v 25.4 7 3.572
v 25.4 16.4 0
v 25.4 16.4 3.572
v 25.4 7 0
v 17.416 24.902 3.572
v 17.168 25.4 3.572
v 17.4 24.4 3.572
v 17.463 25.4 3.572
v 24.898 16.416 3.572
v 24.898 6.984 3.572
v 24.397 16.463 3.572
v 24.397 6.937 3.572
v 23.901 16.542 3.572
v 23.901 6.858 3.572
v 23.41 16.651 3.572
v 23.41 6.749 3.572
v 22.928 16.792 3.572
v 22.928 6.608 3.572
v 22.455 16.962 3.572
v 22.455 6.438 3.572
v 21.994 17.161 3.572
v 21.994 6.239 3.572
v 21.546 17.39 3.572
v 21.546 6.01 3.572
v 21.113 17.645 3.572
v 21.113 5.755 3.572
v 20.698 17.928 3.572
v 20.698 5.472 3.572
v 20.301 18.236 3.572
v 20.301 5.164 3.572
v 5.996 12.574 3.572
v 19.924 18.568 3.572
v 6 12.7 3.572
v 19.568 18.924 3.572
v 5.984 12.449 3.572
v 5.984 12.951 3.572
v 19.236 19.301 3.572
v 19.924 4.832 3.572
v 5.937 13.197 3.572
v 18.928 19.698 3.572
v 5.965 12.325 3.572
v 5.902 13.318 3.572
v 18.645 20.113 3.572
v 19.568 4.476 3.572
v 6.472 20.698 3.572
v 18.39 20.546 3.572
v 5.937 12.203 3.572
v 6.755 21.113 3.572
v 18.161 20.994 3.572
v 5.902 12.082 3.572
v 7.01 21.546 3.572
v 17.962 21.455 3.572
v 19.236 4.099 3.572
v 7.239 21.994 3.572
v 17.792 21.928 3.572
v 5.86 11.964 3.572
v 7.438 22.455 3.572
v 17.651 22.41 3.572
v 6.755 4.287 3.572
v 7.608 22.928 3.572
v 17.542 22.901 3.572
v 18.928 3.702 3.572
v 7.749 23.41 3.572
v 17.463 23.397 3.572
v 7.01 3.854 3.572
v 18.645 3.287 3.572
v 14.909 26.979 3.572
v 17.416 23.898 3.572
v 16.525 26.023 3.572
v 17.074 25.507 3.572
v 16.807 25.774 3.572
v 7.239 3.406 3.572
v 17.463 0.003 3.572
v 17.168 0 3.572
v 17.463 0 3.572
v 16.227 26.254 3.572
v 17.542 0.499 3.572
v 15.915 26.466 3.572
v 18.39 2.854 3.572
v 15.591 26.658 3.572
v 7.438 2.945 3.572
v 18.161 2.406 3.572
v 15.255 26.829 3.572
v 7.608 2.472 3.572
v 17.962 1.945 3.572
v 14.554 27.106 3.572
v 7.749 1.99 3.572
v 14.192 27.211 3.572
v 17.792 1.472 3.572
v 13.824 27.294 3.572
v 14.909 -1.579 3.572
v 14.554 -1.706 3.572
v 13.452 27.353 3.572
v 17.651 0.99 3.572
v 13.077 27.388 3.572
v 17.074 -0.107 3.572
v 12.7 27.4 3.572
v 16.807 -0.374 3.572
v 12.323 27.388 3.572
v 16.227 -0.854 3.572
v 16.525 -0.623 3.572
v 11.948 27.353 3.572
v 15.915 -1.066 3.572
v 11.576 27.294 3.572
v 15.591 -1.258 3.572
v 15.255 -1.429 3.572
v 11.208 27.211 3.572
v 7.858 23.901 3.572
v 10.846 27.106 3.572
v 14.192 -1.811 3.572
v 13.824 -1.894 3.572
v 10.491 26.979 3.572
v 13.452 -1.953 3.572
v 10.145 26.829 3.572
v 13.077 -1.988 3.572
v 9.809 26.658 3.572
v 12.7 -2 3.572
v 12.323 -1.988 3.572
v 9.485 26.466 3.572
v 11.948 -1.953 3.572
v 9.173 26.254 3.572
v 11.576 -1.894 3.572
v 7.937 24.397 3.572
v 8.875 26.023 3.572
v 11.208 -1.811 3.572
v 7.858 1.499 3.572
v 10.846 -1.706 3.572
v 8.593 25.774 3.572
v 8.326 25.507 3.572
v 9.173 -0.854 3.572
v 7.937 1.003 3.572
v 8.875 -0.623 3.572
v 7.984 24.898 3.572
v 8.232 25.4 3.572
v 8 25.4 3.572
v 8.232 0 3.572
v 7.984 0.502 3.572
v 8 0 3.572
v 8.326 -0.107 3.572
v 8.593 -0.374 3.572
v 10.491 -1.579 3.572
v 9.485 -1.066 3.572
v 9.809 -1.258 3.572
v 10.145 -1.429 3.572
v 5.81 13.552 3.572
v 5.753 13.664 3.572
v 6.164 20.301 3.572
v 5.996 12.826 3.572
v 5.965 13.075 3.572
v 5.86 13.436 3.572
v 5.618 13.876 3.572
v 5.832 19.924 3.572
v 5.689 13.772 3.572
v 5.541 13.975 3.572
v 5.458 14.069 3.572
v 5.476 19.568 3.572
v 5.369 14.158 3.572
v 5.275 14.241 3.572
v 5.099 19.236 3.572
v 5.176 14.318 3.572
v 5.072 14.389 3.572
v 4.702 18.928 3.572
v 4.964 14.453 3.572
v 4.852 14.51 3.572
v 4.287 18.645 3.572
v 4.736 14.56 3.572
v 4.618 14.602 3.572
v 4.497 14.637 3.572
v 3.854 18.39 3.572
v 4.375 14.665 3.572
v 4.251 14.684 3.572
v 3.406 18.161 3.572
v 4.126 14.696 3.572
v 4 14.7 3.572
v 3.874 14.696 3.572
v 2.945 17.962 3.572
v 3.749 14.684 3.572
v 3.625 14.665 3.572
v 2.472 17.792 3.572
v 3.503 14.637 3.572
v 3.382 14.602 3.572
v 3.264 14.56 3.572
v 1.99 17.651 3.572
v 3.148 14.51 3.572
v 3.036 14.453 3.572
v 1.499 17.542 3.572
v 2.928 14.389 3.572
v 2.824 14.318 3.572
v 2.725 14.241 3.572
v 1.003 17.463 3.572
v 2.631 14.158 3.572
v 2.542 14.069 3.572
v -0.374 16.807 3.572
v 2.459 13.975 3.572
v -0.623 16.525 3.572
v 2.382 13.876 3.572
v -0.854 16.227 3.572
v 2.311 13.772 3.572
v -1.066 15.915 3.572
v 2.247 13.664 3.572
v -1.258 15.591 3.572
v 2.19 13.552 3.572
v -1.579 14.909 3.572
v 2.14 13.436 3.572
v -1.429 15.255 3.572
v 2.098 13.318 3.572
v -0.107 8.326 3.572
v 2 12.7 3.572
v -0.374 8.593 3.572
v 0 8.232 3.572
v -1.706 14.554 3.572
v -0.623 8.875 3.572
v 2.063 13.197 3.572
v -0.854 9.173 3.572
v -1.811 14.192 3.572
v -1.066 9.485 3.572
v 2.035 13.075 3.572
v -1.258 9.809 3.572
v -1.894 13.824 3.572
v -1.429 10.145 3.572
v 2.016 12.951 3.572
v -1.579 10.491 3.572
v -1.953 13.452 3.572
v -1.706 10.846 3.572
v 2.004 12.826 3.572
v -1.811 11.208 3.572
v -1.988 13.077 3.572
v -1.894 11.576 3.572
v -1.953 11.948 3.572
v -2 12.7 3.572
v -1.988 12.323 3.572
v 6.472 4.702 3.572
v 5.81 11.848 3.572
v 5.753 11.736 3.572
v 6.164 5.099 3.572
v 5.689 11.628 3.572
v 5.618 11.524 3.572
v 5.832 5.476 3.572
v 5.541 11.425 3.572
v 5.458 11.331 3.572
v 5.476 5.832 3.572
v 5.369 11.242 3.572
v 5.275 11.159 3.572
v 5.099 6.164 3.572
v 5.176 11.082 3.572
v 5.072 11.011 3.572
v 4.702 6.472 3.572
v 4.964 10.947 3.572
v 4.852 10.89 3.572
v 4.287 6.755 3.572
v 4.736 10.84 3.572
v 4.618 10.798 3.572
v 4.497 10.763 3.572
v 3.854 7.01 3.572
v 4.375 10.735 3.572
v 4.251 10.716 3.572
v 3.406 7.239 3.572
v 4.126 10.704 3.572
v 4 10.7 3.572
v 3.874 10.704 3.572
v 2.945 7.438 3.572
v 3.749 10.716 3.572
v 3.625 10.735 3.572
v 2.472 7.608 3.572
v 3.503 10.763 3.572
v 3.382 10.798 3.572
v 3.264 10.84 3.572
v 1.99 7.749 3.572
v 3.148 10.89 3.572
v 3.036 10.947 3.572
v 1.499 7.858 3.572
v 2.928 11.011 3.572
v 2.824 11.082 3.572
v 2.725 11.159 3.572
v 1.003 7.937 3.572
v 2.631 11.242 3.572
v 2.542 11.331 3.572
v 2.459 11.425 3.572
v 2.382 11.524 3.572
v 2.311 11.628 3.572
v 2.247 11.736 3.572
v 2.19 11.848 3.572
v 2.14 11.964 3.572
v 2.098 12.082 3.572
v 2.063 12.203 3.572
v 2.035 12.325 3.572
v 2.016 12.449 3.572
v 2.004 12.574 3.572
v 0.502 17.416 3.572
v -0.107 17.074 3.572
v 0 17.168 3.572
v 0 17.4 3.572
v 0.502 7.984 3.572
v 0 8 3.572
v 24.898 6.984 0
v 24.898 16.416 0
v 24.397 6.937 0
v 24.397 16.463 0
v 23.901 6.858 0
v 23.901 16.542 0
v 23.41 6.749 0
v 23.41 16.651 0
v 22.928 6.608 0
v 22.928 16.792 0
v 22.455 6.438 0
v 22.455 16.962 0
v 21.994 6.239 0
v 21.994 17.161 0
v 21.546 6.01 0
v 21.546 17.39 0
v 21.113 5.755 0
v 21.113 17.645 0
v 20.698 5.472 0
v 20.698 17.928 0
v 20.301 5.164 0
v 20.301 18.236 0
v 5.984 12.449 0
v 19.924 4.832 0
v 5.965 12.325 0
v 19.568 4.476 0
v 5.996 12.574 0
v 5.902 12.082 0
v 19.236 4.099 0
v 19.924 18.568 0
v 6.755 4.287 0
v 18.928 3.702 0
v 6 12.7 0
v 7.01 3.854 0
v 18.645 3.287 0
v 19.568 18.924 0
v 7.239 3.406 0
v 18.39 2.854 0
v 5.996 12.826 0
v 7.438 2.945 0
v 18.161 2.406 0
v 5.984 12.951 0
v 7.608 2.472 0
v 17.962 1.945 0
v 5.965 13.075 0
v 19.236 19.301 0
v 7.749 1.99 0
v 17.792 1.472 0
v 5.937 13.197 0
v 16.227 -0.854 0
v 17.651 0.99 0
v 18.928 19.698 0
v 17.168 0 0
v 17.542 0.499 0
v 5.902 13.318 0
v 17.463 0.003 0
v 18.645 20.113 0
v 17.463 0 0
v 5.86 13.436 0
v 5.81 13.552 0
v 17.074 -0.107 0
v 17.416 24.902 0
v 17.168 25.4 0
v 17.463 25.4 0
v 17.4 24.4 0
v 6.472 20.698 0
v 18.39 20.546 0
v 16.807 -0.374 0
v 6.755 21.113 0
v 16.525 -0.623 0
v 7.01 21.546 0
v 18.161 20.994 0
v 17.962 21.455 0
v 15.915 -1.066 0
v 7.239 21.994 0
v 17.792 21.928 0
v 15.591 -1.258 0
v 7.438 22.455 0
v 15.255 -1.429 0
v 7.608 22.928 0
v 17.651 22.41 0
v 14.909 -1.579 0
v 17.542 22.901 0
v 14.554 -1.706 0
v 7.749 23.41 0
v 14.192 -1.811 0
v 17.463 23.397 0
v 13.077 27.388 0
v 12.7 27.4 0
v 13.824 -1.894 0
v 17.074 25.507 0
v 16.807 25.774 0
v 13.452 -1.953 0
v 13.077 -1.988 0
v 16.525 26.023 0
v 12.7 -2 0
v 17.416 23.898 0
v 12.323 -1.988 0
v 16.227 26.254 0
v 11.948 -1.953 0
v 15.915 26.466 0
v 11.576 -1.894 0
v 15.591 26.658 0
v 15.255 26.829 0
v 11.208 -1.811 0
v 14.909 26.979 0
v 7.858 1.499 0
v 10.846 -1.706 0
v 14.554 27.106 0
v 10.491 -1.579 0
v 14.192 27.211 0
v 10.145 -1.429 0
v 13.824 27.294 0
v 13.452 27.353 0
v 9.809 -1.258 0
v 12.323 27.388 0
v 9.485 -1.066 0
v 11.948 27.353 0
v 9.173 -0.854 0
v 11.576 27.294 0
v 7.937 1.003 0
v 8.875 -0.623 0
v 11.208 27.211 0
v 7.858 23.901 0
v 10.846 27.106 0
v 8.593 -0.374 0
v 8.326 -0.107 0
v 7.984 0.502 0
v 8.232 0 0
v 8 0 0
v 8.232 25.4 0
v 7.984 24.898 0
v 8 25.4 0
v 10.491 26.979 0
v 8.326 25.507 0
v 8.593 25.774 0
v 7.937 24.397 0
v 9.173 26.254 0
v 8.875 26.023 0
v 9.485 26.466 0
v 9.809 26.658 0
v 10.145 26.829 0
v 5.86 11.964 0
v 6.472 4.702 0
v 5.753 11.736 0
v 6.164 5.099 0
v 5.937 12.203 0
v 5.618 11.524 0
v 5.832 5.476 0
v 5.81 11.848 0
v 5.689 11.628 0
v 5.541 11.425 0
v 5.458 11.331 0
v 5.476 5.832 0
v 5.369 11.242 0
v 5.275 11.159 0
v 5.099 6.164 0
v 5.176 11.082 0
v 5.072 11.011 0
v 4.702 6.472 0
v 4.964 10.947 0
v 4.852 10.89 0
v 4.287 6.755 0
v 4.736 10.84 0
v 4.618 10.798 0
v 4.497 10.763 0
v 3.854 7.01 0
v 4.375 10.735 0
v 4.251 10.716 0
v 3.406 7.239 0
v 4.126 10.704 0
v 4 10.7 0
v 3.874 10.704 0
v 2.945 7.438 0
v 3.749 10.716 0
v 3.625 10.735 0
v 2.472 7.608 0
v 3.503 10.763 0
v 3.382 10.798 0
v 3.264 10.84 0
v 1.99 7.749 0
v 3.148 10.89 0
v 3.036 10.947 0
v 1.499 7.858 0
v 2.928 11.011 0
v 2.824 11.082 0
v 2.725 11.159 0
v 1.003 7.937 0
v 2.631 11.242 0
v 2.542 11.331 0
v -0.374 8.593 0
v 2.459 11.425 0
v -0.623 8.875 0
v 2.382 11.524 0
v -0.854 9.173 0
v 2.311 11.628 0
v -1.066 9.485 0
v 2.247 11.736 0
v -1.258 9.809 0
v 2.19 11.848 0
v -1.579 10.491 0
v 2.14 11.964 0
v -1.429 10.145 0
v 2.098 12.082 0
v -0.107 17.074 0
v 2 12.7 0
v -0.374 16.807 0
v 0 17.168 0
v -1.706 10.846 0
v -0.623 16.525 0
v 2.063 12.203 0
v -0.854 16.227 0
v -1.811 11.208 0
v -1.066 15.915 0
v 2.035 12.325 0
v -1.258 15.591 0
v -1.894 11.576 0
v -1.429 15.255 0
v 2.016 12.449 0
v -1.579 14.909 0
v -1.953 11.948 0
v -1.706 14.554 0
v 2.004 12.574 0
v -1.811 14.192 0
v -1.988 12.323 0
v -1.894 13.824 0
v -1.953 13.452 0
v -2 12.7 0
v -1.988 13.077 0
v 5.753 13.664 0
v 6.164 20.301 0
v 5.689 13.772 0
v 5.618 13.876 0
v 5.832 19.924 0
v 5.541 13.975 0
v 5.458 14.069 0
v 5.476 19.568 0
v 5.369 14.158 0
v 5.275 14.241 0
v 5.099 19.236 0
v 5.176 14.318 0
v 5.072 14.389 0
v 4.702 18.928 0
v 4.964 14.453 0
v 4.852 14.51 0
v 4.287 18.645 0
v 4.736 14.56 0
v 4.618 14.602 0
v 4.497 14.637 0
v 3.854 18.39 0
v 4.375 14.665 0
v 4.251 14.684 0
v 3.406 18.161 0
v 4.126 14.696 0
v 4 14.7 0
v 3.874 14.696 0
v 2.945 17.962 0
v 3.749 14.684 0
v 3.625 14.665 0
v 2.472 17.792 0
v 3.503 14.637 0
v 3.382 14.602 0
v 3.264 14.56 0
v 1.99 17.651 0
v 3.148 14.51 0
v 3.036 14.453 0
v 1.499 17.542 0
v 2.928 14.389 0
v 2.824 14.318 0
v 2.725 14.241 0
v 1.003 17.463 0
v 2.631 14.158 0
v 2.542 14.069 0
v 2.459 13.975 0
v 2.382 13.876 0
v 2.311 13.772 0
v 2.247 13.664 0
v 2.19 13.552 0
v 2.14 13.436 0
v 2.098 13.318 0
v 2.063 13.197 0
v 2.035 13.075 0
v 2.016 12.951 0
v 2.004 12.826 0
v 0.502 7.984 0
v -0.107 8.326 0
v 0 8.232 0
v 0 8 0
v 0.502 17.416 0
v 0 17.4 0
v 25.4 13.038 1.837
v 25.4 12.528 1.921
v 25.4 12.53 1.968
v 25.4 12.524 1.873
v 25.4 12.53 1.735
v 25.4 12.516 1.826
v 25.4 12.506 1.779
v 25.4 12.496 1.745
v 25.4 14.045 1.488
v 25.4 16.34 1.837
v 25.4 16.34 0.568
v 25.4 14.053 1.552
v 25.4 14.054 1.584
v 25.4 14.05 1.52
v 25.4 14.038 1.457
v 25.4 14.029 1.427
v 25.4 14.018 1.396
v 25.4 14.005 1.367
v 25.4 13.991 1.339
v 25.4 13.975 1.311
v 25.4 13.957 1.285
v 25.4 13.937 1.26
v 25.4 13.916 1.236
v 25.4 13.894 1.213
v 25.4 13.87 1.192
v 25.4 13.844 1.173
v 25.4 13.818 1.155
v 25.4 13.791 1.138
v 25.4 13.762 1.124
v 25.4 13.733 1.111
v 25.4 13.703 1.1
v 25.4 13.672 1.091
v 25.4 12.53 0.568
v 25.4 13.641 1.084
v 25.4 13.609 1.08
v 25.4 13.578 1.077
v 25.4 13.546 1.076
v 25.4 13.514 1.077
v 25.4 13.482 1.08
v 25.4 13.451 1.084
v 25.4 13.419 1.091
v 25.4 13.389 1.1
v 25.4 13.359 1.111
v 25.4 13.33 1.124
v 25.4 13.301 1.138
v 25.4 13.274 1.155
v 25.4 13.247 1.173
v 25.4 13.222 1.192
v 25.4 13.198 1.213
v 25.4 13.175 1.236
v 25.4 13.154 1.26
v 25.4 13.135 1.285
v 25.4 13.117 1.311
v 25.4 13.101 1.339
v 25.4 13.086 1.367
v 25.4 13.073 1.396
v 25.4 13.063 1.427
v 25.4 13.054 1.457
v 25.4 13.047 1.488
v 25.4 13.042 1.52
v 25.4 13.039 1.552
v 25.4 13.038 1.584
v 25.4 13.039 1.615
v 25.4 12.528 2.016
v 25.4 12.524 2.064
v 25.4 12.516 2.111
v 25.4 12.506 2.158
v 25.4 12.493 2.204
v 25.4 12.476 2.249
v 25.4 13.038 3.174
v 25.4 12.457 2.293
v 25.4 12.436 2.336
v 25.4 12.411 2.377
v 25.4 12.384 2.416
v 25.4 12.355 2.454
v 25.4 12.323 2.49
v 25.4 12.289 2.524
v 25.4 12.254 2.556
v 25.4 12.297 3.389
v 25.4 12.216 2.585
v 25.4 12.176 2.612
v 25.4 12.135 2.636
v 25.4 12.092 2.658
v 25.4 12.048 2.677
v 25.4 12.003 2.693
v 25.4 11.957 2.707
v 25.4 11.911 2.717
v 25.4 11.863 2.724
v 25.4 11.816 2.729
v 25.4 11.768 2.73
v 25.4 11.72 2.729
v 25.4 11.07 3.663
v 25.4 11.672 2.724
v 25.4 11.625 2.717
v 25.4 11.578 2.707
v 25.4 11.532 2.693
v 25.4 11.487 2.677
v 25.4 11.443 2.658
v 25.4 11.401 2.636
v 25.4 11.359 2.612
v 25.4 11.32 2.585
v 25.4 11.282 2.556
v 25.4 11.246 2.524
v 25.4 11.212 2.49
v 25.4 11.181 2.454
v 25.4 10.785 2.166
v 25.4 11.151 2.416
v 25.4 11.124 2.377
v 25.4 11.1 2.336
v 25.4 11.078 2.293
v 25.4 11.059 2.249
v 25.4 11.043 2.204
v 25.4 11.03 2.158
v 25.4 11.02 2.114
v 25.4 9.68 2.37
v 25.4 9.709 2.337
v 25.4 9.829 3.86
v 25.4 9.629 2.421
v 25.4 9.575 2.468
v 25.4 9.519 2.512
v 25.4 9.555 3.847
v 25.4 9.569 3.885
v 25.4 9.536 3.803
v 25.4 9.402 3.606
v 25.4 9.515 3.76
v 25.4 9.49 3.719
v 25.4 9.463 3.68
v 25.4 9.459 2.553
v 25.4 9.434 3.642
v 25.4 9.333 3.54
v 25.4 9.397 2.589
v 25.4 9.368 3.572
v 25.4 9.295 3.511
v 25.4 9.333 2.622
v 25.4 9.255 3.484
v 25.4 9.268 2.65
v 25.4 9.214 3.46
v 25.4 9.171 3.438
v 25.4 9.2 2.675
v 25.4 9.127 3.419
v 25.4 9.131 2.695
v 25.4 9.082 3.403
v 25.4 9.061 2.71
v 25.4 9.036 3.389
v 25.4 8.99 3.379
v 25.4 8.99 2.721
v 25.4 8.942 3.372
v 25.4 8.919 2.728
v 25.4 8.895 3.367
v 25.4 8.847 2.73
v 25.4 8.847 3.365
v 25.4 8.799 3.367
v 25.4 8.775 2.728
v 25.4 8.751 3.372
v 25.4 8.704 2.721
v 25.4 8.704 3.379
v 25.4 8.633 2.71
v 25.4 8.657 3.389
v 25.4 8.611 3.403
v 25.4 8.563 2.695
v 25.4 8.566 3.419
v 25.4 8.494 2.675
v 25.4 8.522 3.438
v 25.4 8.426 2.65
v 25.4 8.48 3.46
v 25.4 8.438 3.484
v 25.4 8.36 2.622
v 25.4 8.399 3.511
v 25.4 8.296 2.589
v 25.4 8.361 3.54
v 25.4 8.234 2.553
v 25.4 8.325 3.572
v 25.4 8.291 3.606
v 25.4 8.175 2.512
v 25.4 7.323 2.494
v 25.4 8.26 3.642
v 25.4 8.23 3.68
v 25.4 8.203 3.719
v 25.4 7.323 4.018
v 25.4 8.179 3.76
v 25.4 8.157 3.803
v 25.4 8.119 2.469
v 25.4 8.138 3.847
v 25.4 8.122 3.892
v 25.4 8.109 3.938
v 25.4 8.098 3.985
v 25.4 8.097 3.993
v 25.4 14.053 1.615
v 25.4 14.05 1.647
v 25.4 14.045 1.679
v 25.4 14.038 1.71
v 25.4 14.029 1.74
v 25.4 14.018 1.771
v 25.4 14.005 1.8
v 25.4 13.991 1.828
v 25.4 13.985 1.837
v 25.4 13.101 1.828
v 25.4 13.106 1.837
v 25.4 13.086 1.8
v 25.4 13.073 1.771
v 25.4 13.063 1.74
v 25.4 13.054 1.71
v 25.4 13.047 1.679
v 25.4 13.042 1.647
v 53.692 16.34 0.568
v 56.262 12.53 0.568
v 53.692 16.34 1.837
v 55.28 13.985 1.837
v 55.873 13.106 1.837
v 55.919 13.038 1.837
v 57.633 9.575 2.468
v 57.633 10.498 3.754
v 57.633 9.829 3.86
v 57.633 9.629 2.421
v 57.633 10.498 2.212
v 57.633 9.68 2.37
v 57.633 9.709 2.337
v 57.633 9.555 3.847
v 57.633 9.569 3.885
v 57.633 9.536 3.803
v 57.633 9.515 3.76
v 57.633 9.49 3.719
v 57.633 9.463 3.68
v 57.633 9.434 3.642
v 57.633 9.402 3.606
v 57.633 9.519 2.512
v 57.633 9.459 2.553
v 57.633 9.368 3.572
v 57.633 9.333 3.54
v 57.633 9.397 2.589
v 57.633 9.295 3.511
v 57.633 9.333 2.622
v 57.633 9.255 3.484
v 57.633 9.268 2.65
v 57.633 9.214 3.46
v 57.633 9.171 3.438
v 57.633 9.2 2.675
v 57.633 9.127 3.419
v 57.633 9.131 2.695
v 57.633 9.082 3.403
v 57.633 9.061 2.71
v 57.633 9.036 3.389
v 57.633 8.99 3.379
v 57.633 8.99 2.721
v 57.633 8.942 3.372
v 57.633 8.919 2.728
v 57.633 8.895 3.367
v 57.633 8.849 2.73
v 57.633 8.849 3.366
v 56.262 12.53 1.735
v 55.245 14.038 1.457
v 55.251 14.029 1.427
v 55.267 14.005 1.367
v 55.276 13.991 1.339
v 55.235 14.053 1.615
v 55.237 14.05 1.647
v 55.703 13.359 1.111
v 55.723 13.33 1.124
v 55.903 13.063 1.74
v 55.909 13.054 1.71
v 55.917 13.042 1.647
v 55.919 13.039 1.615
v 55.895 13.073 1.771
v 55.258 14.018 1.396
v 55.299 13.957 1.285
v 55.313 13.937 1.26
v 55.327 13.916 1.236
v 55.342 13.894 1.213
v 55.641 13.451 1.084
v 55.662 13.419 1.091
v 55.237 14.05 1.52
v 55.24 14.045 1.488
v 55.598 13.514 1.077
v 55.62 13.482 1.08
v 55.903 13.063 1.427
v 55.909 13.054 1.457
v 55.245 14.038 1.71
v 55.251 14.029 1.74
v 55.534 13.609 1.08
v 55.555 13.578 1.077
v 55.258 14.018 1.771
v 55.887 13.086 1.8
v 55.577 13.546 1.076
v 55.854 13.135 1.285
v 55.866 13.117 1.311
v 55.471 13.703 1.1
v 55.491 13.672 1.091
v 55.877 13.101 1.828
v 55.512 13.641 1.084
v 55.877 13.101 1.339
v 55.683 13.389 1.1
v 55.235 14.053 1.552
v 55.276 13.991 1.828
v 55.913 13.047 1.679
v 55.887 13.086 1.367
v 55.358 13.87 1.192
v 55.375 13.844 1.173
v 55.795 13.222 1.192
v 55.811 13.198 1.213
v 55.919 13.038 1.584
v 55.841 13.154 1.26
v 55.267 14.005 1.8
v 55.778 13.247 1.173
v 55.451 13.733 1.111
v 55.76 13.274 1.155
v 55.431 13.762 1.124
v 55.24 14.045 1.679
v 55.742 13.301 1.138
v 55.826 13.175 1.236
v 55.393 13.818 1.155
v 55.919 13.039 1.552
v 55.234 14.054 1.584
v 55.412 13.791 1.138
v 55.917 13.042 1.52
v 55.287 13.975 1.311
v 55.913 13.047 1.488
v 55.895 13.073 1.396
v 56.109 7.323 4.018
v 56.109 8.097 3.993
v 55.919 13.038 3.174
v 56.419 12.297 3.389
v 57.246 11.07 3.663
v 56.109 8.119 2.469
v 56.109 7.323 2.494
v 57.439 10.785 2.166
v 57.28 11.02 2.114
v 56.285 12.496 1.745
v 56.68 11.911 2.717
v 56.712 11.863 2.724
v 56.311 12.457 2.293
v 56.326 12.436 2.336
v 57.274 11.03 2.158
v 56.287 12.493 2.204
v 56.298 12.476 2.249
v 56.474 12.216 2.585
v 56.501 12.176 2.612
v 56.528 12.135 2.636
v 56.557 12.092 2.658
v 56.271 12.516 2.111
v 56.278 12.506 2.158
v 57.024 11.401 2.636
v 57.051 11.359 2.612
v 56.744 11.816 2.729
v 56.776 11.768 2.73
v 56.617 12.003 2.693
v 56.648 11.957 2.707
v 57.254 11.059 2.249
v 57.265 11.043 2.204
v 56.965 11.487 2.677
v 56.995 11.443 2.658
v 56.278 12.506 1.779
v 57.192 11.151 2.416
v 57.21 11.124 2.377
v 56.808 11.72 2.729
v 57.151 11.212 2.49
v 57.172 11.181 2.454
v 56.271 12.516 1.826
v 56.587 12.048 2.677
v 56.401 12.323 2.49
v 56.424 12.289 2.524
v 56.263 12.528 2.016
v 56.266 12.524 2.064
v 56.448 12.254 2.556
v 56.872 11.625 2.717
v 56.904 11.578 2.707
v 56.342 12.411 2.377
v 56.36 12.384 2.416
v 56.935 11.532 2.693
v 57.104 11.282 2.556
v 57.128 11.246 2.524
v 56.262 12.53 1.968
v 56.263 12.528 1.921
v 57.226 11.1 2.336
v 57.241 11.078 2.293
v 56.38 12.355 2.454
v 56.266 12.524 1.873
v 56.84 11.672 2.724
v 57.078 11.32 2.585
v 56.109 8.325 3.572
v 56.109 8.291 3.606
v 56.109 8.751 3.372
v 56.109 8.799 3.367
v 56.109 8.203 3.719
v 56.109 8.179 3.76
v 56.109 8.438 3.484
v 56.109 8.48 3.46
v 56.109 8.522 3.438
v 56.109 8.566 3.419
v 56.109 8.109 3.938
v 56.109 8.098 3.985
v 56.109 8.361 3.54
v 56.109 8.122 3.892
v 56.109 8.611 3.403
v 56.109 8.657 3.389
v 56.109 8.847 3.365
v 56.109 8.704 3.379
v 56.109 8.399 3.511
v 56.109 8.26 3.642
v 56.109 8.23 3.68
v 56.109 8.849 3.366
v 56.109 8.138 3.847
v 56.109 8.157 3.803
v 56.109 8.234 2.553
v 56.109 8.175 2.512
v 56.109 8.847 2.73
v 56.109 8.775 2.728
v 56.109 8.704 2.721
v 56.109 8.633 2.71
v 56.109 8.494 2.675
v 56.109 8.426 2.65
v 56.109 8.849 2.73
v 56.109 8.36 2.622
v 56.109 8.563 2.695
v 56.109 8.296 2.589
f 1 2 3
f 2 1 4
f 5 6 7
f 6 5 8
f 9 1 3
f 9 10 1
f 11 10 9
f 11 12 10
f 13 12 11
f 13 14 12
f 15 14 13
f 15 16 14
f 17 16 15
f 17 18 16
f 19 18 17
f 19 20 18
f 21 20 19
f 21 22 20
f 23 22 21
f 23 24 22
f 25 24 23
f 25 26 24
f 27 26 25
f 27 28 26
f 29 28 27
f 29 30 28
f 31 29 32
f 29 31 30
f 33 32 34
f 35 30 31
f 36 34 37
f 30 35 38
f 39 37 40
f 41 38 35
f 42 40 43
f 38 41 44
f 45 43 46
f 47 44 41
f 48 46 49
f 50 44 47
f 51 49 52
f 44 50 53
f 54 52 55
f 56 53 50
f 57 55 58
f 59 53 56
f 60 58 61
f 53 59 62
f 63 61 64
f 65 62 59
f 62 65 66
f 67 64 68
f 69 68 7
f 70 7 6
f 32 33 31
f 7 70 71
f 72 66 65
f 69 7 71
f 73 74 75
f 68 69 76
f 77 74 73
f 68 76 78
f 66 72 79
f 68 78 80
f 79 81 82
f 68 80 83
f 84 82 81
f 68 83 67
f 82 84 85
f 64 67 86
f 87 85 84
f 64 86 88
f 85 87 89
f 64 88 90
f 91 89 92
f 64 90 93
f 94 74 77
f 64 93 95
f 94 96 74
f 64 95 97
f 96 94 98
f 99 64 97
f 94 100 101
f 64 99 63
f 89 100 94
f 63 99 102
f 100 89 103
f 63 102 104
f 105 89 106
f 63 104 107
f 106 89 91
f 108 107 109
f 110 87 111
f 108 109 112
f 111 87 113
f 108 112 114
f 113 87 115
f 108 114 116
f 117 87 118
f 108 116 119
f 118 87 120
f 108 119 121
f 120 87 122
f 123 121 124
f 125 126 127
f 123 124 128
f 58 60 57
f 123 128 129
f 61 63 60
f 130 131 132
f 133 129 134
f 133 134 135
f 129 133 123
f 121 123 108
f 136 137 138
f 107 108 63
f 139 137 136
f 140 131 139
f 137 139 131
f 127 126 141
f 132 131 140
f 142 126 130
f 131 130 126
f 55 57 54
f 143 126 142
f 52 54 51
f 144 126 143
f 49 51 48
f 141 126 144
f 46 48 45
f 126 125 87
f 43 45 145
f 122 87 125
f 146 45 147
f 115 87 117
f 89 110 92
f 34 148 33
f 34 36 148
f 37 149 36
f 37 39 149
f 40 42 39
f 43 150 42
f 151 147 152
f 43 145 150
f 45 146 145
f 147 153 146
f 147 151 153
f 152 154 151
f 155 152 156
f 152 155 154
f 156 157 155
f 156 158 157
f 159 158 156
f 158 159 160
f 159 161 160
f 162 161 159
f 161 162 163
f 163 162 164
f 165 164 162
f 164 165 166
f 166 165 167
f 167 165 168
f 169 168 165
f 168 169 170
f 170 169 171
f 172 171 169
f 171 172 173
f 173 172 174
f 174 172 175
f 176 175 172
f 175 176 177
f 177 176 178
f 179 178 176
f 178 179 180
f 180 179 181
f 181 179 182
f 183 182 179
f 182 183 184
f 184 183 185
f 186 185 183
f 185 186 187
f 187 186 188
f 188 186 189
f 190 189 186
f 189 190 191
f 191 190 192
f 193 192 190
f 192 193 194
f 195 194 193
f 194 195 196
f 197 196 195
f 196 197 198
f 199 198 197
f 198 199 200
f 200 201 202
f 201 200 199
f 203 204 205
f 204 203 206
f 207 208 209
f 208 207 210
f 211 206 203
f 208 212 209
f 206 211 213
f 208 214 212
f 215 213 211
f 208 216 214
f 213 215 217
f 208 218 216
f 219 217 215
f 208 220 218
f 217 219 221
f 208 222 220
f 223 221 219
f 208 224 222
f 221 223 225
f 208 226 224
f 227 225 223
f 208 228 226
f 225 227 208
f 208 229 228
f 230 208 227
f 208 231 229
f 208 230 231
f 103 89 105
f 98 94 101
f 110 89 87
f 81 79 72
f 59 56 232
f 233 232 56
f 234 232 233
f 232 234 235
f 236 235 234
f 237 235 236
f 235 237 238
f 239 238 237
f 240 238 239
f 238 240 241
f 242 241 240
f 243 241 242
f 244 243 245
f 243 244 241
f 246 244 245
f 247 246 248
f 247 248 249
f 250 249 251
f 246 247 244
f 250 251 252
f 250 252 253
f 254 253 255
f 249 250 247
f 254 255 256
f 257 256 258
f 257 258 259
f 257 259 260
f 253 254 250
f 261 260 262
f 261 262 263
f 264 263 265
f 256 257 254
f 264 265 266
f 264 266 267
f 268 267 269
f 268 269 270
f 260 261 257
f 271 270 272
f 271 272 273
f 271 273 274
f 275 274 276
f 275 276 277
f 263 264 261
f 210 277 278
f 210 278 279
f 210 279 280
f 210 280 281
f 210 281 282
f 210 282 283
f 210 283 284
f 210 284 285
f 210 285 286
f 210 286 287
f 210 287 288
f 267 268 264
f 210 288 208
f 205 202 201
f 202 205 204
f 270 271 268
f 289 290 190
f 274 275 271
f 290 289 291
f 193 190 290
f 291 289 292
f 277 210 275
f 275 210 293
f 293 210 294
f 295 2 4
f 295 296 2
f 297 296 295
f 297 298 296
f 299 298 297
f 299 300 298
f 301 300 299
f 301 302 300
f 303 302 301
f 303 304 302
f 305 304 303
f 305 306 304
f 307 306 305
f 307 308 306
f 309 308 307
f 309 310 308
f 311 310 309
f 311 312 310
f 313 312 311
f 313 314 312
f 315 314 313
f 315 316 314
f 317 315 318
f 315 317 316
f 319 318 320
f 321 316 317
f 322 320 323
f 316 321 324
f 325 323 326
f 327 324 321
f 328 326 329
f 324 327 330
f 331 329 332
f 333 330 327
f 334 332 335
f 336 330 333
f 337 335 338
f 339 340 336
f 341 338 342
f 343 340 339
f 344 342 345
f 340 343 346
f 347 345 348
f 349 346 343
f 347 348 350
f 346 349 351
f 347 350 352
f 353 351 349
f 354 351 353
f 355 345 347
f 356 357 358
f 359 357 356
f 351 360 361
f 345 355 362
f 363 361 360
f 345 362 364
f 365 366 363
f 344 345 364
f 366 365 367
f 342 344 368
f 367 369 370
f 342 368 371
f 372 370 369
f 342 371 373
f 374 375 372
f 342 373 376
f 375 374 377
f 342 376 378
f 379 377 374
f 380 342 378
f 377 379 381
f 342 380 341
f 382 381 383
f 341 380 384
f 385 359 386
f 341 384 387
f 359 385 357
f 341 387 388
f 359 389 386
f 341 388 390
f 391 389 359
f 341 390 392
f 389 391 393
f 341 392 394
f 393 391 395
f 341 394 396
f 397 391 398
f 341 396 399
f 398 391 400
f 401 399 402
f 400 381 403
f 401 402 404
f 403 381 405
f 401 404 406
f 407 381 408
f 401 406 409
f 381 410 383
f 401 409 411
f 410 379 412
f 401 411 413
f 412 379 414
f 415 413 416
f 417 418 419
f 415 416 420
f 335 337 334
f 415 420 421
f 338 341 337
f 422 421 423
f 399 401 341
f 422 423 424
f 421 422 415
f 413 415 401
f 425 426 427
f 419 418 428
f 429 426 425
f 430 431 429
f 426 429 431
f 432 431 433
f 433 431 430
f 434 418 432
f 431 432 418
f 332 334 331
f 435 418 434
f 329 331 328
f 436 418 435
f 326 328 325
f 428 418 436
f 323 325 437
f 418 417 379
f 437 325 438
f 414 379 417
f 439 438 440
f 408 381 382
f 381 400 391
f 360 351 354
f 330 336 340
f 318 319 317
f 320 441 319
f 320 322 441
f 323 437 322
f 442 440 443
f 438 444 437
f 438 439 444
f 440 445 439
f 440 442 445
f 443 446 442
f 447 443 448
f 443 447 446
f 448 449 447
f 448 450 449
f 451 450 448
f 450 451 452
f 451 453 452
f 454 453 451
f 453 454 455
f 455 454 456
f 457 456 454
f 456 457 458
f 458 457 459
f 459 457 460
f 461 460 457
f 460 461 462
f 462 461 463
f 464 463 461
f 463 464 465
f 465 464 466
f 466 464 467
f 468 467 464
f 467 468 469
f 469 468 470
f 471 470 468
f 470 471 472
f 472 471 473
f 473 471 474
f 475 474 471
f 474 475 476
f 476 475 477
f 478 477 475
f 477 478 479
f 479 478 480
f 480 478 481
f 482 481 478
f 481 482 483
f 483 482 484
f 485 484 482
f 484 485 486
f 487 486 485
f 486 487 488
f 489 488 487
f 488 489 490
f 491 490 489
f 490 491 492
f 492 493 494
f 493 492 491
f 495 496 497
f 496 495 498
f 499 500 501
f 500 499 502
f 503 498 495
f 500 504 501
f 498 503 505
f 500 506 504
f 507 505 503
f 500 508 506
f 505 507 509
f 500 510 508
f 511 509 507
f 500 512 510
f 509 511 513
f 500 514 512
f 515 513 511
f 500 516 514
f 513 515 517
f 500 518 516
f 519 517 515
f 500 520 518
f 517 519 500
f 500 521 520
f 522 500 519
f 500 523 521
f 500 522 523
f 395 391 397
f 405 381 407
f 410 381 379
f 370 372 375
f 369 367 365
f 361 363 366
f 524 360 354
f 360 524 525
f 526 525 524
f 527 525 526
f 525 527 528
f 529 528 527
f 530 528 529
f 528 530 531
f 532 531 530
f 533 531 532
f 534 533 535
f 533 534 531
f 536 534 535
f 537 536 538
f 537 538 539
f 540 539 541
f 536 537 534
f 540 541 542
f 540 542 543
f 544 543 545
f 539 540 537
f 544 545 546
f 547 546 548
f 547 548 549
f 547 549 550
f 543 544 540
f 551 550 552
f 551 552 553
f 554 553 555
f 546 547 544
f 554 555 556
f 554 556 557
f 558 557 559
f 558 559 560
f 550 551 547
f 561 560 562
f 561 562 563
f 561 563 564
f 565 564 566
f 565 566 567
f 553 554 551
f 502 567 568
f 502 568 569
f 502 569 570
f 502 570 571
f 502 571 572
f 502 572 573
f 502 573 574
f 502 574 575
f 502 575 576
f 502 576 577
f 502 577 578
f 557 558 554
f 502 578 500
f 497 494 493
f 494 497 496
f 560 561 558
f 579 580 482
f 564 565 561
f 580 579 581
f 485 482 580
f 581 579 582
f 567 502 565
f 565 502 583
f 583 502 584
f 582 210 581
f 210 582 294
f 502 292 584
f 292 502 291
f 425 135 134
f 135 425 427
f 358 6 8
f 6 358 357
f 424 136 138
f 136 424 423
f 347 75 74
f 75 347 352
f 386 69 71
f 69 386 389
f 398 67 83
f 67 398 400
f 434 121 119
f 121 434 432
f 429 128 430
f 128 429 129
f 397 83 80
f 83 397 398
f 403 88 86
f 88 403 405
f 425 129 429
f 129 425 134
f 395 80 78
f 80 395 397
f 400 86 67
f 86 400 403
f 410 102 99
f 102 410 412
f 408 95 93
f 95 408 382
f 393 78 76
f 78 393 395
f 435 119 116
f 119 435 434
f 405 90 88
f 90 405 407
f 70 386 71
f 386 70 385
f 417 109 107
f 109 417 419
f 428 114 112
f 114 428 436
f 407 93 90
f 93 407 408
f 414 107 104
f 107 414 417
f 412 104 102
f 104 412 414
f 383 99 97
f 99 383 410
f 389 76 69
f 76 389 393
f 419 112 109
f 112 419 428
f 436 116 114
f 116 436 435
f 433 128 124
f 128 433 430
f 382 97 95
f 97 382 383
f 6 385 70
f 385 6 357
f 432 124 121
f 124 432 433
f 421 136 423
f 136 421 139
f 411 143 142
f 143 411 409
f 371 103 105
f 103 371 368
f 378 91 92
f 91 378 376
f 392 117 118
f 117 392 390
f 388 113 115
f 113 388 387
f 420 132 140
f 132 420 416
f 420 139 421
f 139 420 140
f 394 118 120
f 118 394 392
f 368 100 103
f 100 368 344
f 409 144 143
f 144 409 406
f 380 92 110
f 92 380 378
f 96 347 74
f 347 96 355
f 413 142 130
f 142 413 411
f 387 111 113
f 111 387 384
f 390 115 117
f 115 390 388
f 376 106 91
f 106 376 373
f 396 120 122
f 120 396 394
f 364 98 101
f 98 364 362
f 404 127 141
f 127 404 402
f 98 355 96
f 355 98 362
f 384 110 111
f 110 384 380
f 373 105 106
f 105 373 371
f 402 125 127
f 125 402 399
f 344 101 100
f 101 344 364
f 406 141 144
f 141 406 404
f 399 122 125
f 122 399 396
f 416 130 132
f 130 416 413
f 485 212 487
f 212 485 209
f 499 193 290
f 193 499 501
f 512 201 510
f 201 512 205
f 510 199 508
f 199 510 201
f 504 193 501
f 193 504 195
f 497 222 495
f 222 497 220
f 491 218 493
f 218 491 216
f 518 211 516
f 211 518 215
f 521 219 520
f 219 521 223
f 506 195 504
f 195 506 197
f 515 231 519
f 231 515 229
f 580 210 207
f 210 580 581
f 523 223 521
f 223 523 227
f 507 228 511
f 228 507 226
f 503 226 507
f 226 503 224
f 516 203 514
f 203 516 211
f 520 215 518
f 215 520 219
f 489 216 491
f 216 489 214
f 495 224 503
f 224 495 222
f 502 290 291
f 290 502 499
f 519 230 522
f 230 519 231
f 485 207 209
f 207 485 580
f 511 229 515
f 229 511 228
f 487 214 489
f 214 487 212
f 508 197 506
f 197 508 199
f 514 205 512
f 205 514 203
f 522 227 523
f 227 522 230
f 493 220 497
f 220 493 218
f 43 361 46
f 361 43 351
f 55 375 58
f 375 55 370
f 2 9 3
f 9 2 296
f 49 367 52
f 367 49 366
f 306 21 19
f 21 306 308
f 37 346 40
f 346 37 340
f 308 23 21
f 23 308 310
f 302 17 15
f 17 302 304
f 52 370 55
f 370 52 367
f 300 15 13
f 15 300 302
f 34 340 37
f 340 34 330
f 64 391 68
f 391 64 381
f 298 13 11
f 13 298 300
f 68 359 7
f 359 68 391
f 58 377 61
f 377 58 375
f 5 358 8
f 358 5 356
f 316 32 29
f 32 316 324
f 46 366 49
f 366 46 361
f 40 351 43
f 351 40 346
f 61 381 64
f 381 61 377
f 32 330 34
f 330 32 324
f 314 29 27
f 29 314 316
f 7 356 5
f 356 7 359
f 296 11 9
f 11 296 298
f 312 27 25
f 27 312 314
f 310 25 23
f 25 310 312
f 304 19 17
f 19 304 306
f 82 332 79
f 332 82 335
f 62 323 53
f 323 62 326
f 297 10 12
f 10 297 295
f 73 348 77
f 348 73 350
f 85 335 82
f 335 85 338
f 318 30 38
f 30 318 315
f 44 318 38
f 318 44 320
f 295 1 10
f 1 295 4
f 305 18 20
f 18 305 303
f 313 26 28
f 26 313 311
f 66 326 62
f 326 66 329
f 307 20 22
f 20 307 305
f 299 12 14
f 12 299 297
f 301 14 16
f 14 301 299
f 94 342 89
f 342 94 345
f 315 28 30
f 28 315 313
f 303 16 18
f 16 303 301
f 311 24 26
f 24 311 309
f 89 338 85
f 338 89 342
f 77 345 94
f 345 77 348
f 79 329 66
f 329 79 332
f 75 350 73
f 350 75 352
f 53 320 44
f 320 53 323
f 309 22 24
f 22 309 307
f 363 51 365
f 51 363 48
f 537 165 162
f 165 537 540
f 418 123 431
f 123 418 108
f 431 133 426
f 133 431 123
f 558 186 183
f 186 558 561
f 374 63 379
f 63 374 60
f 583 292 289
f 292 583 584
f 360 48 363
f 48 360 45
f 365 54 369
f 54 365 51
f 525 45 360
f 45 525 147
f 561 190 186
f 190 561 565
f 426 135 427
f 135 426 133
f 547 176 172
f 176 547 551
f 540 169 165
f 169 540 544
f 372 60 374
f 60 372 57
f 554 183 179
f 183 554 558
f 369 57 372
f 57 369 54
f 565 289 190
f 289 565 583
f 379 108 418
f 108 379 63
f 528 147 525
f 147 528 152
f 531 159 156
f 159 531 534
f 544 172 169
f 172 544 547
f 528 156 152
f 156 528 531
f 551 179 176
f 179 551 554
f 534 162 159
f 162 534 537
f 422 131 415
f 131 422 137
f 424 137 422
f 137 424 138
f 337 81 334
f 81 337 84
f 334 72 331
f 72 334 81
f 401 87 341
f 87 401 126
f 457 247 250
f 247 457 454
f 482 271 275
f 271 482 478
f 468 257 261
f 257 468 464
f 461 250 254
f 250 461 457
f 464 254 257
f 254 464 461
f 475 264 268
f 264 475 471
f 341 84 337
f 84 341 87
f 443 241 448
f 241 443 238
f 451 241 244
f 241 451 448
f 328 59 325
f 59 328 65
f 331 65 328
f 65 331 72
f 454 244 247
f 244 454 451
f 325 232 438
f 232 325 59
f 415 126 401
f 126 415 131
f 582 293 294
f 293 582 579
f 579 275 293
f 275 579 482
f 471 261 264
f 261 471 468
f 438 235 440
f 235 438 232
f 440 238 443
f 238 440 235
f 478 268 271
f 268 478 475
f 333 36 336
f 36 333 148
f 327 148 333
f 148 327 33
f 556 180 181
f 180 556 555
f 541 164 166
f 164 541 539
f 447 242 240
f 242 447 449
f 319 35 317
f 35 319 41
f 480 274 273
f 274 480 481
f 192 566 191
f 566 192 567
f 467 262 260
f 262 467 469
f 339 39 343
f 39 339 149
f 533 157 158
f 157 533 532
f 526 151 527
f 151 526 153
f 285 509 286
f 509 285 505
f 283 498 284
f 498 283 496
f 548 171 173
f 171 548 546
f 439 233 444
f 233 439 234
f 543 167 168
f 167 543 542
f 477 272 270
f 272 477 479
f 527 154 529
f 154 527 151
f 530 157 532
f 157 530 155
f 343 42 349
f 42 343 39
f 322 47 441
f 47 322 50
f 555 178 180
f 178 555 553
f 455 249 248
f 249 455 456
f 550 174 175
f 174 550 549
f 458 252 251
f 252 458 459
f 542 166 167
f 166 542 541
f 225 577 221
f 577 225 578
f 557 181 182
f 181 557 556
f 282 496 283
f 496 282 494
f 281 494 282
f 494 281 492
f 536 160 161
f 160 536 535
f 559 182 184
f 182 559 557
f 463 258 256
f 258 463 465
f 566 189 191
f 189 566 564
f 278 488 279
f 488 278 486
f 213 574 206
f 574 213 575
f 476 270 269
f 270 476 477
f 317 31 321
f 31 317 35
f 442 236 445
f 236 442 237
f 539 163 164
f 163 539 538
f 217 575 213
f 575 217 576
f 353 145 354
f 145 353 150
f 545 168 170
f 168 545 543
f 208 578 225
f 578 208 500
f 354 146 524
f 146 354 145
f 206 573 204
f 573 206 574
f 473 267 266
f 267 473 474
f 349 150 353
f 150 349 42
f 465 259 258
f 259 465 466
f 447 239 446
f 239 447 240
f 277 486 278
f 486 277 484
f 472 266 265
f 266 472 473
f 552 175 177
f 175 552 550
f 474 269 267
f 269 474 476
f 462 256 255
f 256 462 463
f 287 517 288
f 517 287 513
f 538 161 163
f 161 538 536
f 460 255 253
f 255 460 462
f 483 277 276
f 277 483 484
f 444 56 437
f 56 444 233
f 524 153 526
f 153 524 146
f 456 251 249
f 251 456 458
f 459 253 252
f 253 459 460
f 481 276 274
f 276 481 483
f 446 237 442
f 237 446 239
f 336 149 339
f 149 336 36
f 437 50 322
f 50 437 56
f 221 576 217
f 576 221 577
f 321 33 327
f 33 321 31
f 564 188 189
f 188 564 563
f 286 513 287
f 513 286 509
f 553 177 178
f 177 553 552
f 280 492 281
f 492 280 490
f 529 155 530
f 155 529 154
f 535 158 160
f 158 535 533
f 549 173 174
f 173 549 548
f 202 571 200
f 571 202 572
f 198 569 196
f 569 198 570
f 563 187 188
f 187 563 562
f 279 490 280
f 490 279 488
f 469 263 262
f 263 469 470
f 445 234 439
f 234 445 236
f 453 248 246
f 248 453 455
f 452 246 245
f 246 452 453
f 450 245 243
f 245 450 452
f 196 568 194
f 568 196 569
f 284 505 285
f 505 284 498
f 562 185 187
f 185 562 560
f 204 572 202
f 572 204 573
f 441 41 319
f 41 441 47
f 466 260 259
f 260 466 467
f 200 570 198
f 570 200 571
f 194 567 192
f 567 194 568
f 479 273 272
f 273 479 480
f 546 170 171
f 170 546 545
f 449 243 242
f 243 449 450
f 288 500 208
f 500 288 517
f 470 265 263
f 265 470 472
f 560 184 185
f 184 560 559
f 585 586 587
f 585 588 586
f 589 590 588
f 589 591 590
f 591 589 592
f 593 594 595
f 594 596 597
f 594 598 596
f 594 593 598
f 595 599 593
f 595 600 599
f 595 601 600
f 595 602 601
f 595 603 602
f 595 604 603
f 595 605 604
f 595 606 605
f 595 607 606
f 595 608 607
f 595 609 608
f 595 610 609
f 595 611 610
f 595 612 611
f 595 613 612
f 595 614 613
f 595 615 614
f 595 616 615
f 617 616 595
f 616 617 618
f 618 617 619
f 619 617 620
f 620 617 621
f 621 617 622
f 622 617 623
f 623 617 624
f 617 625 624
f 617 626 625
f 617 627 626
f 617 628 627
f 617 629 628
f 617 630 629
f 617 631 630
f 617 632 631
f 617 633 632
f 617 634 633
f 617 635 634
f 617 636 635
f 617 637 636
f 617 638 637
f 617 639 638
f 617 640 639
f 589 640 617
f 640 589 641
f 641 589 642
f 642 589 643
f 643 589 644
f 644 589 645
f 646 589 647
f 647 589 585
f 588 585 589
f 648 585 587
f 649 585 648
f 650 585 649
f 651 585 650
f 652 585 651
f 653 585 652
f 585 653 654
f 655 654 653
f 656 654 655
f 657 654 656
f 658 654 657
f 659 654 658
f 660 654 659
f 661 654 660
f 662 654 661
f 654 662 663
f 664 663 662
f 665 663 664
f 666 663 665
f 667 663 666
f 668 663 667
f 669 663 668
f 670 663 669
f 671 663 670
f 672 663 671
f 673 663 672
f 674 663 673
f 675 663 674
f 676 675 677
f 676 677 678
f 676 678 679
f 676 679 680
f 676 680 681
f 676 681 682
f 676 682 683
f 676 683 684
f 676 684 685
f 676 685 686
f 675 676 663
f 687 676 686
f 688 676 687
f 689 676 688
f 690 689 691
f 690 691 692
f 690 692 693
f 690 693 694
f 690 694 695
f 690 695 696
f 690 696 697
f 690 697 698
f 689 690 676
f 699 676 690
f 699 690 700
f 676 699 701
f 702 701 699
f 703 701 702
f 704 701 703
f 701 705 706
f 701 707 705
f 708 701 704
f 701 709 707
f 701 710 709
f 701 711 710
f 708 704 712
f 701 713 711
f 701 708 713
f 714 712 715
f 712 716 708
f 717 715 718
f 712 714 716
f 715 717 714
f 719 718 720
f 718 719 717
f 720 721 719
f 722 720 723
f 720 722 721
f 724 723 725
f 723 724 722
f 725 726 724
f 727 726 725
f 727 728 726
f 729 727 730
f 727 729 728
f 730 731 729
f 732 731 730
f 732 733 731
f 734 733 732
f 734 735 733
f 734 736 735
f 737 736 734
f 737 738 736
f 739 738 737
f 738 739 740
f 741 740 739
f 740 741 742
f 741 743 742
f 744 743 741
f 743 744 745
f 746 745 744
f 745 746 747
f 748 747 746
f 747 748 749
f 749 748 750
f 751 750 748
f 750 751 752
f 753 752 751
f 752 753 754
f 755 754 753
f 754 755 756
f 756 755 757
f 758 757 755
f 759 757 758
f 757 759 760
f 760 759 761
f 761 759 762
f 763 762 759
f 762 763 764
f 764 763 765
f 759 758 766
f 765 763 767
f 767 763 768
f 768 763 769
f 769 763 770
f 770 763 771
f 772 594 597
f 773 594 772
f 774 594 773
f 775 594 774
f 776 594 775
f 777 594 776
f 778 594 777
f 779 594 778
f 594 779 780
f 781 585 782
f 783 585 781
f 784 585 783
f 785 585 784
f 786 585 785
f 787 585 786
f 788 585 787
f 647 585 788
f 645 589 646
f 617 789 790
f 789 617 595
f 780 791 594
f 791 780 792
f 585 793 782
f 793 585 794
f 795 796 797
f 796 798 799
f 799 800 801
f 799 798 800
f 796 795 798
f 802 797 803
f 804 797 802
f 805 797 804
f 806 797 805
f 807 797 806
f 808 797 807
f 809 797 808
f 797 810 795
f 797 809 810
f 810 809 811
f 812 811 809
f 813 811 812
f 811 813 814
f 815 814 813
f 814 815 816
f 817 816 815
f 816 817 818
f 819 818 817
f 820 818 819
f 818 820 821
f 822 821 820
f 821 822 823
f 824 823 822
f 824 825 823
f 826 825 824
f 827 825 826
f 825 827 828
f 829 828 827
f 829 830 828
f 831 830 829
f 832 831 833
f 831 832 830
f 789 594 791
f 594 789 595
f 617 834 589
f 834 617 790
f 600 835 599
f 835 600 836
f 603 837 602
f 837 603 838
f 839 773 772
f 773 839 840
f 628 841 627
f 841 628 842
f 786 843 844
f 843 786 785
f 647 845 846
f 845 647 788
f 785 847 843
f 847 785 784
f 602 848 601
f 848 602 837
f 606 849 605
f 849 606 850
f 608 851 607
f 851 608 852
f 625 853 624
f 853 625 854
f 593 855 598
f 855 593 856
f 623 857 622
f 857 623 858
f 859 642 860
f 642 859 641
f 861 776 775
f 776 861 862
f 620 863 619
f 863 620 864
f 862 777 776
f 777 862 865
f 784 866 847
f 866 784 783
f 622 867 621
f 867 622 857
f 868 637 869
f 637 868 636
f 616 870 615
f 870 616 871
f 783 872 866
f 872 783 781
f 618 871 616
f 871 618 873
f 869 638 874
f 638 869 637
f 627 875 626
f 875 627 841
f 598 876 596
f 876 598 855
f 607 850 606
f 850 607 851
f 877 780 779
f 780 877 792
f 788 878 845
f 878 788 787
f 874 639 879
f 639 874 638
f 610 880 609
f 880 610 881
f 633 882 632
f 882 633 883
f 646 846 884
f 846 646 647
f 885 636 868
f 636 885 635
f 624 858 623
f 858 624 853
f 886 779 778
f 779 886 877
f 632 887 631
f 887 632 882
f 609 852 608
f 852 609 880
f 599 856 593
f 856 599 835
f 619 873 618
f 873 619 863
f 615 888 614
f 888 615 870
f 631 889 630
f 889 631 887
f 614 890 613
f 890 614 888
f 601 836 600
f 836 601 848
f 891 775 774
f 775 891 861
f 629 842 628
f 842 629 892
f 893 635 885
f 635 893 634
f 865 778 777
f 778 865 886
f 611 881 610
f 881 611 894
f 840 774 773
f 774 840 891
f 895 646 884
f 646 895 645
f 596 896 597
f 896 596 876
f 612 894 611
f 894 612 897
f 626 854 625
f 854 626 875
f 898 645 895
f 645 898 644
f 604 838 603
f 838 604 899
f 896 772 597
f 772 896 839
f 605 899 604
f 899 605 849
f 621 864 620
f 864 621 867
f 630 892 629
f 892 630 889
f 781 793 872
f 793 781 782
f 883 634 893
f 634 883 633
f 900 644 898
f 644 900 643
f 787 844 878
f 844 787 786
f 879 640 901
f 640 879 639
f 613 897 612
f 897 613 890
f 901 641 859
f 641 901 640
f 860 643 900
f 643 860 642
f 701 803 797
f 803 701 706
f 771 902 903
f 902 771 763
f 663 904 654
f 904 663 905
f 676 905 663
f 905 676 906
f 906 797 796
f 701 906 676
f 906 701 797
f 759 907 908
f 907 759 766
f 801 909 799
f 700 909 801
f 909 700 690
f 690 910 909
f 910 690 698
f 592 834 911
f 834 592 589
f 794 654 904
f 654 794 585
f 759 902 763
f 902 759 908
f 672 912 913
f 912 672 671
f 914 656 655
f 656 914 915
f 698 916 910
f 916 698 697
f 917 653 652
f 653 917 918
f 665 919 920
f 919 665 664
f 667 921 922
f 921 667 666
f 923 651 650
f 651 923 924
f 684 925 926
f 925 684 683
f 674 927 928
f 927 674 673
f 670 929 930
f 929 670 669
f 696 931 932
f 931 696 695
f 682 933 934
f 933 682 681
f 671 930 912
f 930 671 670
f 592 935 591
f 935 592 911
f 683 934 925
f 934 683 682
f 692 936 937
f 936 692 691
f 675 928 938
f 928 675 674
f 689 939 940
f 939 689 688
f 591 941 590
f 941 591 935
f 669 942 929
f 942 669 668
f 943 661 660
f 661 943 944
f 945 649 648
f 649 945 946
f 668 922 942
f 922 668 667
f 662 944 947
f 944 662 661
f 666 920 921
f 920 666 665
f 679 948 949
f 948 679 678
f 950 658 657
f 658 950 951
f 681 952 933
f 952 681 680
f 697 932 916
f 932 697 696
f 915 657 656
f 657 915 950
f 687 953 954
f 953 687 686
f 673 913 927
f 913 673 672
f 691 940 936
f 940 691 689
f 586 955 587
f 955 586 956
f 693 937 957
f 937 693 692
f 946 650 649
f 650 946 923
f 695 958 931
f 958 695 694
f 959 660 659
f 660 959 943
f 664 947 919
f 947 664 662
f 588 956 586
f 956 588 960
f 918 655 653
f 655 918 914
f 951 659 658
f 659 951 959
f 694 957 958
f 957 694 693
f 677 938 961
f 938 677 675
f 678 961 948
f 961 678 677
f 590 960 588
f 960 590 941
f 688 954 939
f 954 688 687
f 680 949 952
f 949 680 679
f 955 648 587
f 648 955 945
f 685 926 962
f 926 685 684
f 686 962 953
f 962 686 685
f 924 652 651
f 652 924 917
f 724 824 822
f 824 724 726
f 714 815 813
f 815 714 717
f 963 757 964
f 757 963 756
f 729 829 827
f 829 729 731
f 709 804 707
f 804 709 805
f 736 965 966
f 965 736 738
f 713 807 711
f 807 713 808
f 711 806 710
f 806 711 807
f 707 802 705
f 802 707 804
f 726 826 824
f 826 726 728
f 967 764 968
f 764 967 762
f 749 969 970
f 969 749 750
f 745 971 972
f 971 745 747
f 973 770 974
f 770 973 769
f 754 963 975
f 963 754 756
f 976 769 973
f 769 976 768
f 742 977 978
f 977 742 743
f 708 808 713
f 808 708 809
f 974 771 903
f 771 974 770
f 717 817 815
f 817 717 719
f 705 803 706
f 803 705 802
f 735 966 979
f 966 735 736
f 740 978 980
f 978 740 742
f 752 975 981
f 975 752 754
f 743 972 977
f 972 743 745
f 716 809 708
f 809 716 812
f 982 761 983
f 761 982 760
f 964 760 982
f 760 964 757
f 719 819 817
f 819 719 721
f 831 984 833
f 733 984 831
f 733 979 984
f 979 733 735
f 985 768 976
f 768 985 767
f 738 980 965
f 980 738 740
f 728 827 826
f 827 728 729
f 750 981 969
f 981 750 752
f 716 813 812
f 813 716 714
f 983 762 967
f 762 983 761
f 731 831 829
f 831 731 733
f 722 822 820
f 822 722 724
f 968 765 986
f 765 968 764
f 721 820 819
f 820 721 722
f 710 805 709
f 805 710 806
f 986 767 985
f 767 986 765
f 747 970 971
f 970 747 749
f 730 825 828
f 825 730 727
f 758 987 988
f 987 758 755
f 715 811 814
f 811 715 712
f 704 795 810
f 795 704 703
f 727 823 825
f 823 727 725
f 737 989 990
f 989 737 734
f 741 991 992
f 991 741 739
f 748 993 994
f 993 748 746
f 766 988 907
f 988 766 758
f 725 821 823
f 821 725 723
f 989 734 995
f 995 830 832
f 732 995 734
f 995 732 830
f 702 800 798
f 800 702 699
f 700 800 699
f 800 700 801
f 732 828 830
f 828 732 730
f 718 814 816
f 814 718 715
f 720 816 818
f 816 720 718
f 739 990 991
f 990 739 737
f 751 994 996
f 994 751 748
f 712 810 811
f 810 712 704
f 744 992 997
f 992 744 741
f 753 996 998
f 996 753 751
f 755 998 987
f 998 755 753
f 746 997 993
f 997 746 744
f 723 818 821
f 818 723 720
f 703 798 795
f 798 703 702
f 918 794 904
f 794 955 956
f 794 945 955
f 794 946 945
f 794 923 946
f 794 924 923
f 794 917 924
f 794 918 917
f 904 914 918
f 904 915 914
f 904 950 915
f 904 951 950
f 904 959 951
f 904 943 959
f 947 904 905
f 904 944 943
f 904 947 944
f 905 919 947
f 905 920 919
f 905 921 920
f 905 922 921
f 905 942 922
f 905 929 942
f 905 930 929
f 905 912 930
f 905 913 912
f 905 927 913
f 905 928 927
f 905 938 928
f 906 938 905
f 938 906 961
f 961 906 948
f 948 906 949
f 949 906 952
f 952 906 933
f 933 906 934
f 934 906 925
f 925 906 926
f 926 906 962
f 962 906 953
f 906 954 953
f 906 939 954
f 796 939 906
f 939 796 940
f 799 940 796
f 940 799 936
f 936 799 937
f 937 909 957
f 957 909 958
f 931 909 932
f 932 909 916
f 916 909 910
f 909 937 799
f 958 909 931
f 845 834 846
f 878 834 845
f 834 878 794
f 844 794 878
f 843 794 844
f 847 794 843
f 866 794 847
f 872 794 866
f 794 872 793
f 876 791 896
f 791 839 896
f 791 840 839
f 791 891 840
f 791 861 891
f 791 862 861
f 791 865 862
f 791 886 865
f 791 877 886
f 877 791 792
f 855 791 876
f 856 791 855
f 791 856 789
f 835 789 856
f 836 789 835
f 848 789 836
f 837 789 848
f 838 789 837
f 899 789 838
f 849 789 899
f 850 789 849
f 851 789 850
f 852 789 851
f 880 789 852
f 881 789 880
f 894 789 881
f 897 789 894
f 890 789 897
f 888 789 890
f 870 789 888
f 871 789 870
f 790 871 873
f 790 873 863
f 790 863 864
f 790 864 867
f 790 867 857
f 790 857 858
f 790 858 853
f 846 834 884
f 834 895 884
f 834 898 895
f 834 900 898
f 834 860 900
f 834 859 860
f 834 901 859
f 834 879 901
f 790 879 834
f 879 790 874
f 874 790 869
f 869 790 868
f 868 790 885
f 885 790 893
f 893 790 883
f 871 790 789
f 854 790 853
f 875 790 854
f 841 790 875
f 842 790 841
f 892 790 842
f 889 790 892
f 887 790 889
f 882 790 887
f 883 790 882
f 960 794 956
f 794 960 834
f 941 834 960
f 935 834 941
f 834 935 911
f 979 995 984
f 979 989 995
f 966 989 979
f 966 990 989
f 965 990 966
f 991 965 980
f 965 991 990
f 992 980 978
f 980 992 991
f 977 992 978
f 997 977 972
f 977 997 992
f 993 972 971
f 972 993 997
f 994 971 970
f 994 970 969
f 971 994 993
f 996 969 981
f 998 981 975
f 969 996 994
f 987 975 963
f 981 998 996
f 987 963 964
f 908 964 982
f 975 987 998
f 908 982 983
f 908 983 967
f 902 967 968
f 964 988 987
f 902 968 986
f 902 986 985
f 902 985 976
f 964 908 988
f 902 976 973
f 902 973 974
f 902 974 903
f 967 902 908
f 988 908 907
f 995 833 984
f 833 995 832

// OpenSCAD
// github.com/ewust/keys
// but done by baburgess looks like

$fn=100;

function mm(i) = i*25.4;

module bow(bow_length, bow_width, bow_thickness)
{
	difference()
		{
				union()
						{
									cube([bow_length, bow_width, bow_thickness]);

											  	     //Place cylinders on the top and bottom of the bow for style

												     	     	       //Top middle
																	translate([bow_length / 2, bow_width - 4, 0]) cylinder(h = bow_thickness, r = 6);

																			      	//Bottom middle
																							translate([bow_length / 2, 4, 0]) cylinder(h = bow_thickness, r = 6);

																									      	//Left
																													translate([4, bow_width / 2, 0]) cylinder(h = bow_thickness, r = 6);
																														      		}

																																	//Place cylinders around the edges to create a more contoured design

																																		//Right top
																																				translate([bow_length, bow_width - 1, 0]) cylinder(h = bow_thickness, r = 8);

																																						       //Right bottom
																																								//Positioned -1 from the axis to create a bow stop
																																									     	translate([bow_length, -1 , 0]) cylinder(h = bow_thickness, r = 8);

																																												       //Left top
																																														translate([0, bow_width, 0]) cylinder(h = bow_thickness, r = 8);

																																															      //Left bottom
																																																	translate([0, 0, 0]) cylinder(h = bow_thickness, r = 8);

																																																		      //Place hole for keychain use
																																																		      	      	   translate([4, bow_width / 2, 0]) cylinder(h = bow_thickness, r = 2);
																																																				   		 }
																																																						 }

module bit()
{
	w = mm(1/4);
	  difference()
		{
				translate([-w/2, 0, 0]) cube([w, mm(1), w]);
						    translate([-mm(7/256), 0, 0]) rotate([0, 0, 135]) cube([w, w, w]);
						    			      translate([mm(7/256), 0, 0]) rotate([0, 0, -45]) cube([w, w, w]);
									      }
									      }

module security_leg(blade_length, radius, security_leg_thickness, security_leg_width, shift)
{
	translate([-shift, 0, 0]) difference()
			   {
					cylinder(h = blade_length, r = radius);
						     cylinder(h = blade_length, r = (radius - security_leg_thickness));
						     		  translate([0, security_leg_width, 0]) cube([radius, radius - security_leg_width, blade_length]);
								  				    translate([0, -radius, 0]) cube([radius, radius, blade_length]);
												    		  	   translate([-radius, -radius, 0]) cube([radius, 2 * radius, blade_length]);
															   		       };
																	       }
																	       module blade(blade_length, blade_width, blade_thickness, key_cuts, shoulder, cut_spacing, cut_depth)
																	       {
																		biting_blade_width = mm(.150);
																				   biting_blade_thickness = mm(.05);
																				   			  security_leg_thickness = mm(.06);
																							  			 security_leg_width = mm(.225);
																										 		    radius = 20;
																												    	   shift = sqrt((radius-security_leg_thickness)*(radius-security_leg_thickness) - security_leg_width*security_leg_width);
																													   	 difference()
																															{

																																translate([blade_length, 0, 0]) rotate([0, 180, 0])
																																			    {
																																						difference()
																																									{
																																													union()
																																																	{
																																																						translate([0, mm(.225) - mm(.02), -.25]) difference()
																																																							      	       	 	  	 {
																																																																	cube([blade_length, biting_blade_width, biting_blade_thickness]);
																																																																										translate([-mm(.075), mm(.04), mm(.01)]) rotate([0, 90, 0]) cylinder(h = blade_length + mm(.1), r = mm(.02));
																																																																												      	       		 	    	}
																																																																																						rotate([0, 90, 0]) security_leg(blade_length, radius, security_leg_thickness, security_leg_width, shift);
																																																																																							       	   			      };

																																																																																														//Cut security leg channels
																																																																																																	translate([0, security_leg_width - (mm(.05)), -mm(.015)]) rotate([0, 90, 0]) cylinder(h = blade_length + mm(.1), r = mm(.03));
																																																																																																		      			   	      translate([0, mm(.06), -mm(.1)]) rotate([0, 90, 0]) cylinder(h = blade_length + mm(.1), r = mm(.03));
																																																																																																						      		    	     	       		  translate([0, mm(.06), 0]) rotate([0, 90, 0]) cylinder(h = blade_length + mm(.1), r = mm(.045));
																																																																																																												  			     };
																																																																																																																	};
																																																																																																																			//Contour tip
																																																																																																																					translate([blade_length, mm(1/8), -20]) {
																																																																																																																								 	  	rotate([0, 0, 34]) cube([10, 10, 40]);
																																																																																																																											      }

																																																																																																																												//Tip stop
																																																																																																																													translate([blade_length - mm(.06), 0, 0]) {
																																																																																																																																  	   cube([mm(.09877), mm(.0601), blade_thickness]);
																																																																																																																																	   		     		}

																																																																																																																																						//Cut the blade
																																																																																																																																						      	  for (counter = [0:6])
																																																																																																																																							      	       {
																																																																																																																																											*translate([shoulder + (counter * cut_spacing) + .5, blade_width - (key_cuts[counter]) * cut_depth - .5, 0]) bit();
																																																																																																																																													       }
																																																																																																																																														}
																																																																																																																																														}

module keymark(key_cuts)
{
	blade_length = mm(1.269);
		     blade_width = mm(.318);
		     		 blade_thickness = mm(0.110);

				 shoulder = mm(0.2);
				 	  cut_spacing = mm(.15);
					  	      cut_depth = mm(.0125);

						      bow_length = mm(1);
						      		 bow_width = mm(1);
								 	   bow_thickness = mm(4.5/32);

									   union()
										{
												bow(bow_length, bow_width, bow_thickness);
															   translate([bow_length, bow_width - blade_width - 10, mm(1/16)]) blade(blade_length, blade_width, blade_thickness, key_cuts, shoulder, cut_spacing, cut_depth);
															   			  }
																		  }

keymark([0, 0, 0, 0, 0, 0, 0]);
